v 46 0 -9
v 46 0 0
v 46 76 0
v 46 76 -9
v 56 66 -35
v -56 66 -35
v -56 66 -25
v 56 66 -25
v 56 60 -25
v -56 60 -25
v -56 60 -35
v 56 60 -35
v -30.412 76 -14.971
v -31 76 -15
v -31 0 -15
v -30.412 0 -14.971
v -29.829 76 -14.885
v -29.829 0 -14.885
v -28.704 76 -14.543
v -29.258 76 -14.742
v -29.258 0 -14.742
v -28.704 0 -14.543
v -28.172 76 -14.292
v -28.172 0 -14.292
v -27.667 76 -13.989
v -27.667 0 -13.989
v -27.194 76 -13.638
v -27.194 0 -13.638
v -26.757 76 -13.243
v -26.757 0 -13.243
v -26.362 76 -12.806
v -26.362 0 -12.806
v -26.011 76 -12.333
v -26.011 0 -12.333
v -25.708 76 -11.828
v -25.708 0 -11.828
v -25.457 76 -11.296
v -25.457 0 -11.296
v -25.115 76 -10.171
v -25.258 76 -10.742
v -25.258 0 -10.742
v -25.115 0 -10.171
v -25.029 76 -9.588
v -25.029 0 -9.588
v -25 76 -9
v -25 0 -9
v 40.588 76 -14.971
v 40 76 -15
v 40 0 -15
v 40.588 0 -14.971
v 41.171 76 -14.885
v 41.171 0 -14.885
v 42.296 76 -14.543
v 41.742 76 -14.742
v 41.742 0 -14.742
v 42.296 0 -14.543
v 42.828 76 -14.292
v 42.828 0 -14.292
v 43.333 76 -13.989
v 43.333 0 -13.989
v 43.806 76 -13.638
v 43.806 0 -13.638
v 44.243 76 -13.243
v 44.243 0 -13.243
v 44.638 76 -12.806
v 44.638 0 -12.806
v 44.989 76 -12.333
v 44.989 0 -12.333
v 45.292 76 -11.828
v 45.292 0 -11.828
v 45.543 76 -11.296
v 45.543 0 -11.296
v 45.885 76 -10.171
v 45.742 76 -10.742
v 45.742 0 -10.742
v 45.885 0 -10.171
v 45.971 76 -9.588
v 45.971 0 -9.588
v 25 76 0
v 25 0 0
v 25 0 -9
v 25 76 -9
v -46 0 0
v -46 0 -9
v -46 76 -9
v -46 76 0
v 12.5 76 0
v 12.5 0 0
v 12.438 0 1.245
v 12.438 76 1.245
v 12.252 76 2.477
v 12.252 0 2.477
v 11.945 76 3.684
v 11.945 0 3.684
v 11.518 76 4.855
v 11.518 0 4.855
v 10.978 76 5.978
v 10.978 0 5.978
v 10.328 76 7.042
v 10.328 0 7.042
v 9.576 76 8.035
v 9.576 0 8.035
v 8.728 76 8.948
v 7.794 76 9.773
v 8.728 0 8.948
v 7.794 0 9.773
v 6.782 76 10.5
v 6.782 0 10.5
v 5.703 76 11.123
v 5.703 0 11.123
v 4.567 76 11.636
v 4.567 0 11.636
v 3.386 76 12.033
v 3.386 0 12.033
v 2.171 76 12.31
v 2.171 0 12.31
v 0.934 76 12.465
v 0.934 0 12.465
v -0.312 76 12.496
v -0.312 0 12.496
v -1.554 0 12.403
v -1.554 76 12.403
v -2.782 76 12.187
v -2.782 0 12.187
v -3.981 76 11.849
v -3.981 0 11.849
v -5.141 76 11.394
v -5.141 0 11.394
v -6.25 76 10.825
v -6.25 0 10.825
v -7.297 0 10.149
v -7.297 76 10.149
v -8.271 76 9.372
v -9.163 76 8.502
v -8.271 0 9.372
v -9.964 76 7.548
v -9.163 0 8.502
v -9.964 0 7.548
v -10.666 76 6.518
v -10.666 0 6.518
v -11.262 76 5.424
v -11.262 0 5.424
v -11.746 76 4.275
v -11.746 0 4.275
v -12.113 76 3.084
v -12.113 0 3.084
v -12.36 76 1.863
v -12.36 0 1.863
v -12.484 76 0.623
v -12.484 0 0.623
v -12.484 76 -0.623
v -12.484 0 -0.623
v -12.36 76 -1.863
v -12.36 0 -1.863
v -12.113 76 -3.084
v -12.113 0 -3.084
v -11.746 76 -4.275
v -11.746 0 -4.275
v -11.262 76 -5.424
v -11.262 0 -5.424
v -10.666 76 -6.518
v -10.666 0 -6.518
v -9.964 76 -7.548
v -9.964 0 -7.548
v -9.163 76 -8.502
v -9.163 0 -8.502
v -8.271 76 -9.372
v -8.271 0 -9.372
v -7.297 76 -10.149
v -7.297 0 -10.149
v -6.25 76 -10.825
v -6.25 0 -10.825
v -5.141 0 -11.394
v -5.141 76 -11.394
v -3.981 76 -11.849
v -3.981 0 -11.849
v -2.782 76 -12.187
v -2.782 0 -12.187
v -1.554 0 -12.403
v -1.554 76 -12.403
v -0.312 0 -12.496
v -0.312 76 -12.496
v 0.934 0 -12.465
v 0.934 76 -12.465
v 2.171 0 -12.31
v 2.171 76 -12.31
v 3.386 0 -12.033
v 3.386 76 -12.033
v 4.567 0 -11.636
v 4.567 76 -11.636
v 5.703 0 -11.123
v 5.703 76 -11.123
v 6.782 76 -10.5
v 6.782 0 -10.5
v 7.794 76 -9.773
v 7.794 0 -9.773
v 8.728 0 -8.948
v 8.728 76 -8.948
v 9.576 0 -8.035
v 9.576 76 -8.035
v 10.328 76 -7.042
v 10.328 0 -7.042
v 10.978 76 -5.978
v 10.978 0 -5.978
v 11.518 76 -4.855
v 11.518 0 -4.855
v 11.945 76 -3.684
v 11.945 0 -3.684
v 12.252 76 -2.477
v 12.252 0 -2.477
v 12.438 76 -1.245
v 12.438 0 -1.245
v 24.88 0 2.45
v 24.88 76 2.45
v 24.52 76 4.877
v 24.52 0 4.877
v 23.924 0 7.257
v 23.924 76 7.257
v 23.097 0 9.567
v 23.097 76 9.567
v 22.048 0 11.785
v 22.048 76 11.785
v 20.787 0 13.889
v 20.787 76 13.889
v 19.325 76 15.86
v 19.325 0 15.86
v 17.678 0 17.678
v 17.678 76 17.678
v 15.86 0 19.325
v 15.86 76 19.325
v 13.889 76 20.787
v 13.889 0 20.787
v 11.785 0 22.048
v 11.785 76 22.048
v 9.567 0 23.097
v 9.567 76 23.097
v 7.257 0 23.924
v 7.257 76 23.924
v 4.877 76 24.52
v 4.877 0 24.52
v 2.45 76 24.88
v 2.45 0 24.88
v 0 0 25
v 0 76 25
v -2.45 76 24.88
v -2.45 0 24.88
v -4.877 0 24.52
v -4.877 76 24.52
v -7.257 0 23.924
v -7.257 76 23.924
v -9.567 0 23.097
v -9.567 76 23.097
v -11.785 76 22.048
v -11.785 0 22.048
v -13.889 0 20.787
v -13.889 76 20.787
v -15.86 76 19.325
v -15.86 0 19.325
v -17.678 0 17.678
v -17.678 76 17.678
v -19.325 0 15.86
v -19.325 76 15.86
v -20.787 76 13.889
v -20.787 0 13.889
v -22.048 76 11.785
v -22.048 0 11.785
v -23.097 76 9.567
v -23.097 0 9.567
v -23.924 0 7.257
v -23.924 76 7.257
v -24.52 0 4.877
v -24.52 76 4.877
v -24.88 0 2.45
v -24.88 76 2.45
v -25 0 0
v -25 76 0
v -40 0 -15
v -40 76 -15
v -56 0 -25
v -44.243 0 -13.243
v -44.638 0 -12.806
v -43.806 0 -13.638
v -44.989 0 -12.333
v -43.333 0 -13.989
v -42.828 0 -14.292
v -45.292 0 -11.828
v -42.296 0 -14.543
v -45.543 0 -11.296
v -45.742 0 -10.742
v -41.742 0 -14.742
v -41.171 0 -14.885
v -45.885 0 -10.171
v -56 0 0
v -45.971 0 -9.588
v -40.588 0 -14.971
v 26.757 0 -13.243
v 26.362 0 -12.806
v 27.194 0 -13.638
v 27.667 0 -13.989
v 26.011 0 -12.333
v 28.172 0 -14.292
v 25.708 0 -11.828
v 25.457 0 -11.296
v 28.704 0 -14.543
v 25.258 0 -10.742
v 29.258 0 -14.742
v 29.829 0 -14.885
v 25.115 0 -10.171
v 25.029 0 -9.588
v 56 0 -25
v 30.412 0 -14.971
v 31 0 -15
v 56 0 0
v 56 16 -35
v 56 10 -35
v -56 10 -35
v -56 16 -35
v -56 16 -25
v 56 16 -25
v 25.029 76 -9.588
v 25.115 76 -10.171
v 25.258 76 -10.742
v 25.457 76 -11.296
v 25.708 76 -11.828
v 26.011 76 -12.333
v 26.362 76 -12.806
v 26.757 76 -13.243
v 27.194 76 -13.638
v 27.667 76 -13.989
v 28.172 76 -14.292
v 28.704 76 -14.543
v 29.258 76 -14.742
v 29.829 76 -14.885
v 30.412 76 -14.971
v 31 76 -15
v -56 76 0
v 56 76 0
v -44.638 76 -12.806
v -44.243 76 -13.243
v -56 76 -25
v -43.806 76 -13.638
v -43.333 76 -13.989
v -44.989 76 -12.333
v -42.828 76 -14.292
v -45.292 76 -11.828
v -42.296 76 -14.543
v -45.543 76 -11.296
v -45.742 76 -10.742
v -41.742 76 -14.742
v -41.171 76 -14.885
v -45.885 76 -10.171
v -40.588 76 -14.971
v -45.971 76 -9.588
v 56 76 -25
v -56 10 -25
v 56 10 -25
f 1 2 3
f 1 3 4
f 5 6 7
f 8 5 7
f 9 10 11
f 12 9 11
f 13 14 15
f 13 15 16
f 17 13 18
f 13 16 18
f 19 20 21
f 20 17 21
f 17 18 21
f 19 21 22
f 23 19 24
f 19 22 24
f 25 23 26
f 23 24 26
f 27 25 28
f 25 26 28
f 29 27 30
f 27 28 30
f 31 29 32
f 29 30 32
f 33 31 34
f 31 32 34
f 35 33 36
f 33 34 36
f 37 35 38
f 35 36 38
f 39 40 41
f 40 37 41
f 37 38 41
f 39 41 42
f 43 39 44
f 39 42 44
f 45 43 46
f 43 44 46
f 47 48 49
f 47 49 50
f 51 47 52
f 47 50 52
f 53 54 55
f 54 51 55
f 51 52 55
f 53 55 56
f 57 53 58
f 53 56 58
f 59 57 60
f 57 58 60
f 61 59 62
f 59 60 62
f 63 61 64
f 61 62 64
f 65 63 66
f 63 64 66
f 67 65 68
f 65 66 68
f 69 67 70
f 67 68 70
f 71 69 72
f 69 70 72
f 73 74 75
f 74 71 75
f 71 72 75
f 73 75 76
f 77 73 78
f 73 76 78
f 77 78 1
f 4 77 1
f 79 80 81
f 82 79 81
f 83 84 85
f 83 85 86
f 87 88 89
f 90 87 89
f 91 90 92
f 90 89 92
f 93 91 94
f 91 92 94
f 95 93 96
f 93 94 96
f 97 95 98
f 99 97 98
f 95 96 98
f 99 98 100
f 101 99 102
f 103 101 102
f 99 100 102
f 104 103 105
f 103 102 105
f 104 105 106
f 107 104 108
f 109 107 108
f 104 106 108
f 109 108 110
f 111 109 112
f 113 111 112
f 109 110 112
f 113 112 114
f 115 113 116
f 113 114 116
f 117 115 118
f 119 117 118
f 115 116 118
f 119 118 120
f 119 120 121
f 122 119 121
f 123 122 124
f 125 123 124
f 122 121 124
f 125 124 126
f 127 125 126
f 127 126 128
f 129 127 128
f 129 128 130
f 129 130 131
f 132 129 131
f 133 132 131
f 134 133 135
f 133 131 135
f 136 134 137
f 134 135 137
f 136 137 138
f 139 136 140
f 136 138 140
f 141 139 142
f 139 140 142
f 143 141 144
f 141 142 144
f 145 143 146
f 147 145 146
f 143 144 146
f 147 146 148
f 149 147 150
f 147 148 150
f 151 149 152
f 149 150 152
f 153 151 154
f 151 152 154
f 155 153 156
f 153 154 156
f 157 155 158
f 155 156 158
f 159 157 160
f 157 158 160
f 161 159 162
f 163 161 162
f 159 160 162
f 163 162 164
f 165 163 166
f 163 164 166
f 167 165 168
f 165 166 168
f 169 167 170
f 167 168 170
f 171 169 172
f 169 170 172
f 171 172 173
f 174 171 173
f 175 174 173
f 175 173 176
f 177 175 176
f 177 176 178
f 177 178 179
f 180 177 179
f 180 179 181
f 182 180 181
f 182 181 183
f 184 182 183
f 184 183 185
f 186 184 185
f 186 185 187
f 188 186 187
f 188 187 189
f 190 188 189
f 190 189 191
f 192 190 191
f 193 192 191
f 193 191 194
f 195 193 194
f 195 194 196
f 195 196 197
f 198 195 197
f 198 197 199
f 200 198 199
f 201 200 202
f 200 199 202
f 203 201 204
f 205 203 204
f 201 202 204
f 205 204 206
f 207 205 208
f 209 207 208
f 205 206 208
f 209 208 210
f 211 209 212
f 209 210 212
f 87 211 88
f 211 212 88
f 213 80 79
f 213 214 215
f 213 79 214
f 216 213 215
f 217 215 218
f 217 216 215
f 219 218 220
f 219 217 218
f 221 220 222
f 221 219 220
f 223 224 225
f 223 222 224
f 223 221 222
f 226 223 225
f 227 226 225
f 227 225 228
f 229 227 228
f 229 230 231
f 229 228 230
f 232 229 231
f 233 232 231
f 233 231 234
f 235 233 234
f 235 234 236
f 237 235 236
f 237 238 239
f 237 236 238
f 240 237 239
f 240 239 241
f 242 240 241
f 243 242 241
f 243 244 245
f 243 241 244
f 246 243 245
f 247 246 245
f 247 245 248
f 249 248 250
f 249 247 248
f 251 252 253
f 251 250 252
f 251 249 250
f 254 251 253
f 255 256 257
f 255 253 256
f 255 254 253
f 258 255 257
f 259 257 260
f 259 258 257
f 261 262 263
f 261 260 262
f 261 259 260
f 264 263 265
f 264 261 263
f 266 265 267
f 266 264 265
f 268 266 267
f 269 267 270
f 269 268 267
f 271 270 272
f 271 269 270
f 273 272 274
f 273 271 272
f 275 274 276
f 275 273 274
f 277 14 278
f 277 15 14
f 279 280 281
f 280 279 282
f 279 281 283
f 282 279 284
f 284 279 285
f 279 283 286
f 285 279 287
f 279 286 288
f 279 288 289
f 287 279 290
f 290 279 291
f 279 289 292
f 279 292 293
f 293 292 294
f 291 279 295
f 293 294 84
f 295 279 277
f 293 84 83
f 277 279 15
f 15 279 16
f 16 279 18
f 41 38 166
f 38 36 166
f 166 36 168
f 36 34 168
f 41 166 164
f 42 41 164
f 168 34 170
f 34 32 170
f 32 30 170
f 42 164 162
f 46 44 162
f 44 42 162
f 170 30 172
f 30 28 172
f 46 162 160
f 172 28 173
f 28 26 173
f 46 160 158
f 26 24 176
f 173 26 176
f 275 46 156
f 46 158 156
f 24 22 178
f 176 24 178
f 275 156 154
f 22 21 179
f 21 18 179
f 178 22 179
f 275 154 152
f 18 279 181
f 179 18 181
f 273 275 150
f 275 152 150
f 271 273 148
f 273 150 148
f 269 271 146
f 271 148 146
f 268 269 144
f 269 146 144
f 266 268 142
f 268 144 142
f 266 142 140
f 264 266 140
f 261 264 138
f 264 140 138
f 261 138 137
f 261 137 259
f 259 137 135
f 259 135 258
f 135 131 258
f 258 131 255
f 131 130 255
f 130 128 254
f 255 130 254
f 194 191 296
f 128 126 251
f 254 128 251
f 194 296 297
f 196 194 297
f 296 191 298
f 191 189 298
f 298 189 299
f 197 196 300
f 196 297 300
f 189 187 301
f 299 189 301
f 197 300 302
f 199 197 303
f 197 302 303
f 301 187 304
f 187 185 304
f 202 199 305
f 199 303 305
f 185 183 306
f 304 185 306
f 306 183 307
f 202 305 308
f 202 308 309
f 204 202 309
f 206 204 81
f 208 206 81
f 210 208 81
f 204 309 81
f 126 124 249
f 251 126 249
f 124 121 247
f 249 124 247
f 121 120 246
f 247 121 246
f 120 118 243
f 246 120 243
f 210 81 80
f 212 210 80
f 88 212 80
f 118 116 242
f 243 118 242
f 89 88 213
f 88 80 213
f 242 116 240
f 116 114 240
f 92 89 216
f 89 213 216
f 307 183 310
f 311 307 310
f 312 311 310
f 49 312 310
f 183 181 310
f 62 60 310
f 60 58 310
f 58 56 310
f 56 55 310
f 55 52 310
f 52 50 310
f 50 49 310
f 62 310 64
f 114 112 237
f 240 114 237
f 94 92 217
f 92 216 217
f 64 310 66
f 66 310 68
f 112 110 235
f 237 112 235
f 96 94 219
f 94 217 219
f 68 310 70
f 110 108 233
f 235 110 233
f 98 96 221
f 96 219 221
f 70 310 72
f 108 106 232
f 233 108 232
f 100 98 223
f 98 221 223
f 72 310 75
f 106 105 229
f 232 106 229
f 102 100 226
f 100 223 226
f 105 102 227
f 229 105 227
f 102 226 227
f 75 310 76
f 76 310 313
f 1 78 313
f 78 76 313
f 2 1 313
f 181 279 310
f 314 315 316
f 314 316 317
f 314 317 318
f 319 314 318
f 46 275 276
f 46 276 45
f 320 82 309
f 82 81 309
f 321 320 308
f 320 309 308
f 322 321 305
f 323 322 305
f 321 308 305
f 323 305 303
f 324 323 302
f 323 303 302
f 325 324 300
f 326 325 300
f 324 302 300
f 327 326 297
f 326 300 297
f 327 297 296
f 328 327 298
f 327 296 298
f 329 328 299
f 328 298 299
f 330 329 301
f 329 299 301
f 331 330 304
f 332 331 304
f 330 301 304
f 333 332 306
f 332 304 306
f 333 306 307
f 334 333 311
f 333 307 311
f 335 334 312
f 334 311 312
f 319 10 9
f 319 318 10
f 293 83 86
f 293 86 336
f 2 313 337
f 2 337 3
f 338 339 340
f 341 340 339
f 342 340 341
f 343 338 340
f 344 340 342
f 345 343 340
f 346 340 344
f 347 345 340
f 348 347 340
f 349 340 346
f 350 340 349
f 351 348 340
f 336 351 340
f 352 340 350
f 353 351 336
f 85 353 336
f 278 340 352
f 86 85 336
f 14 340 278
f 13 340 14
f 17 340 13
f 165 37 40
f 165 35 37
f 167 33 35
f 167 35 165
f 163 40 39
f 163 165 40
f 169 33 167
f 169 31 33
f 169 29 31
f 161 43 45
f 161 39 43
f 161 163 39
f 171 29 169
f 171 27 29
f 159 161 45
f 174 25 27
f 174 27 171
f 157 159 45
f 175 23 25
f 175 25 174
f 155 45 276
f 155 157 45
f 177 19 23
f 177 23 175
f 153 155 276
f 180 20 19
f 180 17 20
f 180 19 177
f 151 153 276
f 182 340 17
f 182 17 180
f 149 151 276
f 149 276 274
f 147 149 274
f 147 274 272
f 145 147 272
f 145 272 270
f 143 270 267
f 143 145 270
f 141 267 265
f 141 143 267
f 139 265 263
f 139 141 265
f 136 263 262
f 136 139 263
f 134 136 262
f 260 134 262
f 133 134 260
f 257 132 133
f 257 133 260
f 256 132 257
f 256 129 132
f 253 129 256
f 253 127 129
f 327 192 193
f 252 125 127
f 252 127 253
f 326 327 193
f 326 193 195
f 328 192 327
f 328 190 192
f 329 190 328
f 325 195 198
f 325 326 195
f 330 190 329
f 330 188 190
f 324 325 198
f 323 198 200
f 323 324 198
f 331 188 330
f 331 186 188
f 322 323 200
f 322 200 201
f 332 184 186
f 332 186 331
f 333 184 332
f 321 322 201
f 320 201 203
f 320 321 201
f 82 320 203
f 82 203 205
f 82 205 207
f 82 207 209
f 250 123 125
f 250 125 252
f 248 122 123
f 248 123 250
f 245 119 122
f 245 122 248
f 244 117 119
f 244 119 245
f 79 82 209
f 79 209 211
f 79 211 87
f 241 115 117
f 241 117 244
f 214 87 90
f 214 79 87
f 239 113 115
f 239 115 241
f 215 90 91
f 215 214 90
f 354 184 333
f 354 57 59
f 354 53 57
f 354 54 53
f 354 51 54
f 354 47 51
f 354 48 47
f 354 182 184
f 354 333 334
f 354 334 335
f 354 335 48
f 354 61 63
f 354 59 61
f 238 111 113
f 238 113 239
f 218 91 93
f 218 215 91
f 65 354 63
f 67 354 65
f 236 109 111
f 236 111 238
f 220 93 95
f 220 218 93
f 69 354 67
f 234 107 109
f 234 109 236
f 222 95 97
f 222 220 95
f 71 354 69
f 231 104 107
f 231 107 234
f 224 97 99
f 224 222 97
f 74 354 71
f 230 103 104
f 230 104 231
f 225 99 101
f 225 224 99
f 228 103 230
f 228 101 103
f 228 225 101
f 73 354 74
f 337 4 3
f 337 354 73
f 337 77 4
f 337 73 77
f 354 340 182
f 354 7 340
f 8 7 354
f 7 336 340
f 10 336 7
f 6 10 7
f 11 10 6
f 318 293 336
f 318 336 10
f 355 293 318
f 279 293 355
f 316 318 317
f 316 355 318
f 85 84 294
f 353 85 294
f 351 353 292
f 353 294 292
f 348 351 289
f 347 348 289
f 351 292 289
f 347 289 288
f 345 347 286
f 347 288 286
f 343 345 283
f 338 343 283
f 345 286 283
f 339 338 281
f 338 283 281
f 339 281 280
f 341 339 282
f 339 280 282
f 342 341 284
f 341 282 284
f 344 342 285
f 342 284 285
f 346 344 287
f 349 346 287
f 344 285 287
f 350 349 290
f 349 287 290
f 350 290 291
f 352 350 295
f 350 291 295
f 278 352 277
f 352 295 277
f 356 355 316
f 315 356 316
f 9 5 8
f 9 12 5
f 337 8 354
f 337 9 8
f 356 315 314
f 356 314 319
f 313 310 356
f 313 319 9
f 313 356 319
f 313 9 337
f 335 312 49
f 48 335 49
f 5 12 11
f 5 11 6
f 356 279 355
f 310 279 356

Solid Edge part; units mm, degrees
sketch "Sketch1" plane through (0, 0, 0) normal (0, -1, 0) x (1, 0, 0)
  line L0 (25, 0) -> (25, -9)
  arc A0 (25, -9) -> (31, -15) centre (31, -9) ccw
  line L1 (31, -15) -> (40, -15)
  arc A1 (46, -9) -> (40, -15) centre (40, -9) cw
  line L2 (46, 0) -> (46, -9)
  line L3 (56, 0) -> (46, 0)
  line L4 (56, -25) -> (56, 0)
  line L5 (-56, -25) -> (56, -25)
  line L6 (-56, 0) -> (-56, -25)
  line L7 (-46, 0) -> (-56, 0)
  line L8 (-46, -9) -> (-46, 0)
  arc A2 (-46, -9) -> (-40, -15) centre (-40, -9) ccw
  line L9 (-31, -15) -> (-40, -15)
  arc A3 (-25, -9) -> (-31, -15) centre (-31, -9) cw
  line L10 (-25, 0) -> (-25, -9)
  arc A4 (-25, 0) -> (25, 0) centre (0, 0) cw
  circle A5 centre (0, 0) radius 12.5
extrude "Protrusion1" add sketch "Sketch1" against normal blind 76
sketch "Sketch2" plane through (56, 38, -12.5) normal (1, 0, 0) x (0, 1, 0)
  line L0 (-28, -12.5) -> (-28, -22.5)
  line L1 (-28, -22.5) -> (-22, -22.5)
  line L2 (-22, -22.5) -> (-22, -12.5)
  line L3 (-22, -12.5) -> (-28, -12.5)
  line L4 (22, -12.5) -> (22, -22.5)
  line L5 (22, -22.5) -> (28, -22.5)
  line L6 (28, -22.5) -> (28, -12.5)
  line L7 (28, -12.5) -> (22, -12.5)
extrude "ExtrudedProtrusion_2" add sketch "Sketch2" against normal blind 112
